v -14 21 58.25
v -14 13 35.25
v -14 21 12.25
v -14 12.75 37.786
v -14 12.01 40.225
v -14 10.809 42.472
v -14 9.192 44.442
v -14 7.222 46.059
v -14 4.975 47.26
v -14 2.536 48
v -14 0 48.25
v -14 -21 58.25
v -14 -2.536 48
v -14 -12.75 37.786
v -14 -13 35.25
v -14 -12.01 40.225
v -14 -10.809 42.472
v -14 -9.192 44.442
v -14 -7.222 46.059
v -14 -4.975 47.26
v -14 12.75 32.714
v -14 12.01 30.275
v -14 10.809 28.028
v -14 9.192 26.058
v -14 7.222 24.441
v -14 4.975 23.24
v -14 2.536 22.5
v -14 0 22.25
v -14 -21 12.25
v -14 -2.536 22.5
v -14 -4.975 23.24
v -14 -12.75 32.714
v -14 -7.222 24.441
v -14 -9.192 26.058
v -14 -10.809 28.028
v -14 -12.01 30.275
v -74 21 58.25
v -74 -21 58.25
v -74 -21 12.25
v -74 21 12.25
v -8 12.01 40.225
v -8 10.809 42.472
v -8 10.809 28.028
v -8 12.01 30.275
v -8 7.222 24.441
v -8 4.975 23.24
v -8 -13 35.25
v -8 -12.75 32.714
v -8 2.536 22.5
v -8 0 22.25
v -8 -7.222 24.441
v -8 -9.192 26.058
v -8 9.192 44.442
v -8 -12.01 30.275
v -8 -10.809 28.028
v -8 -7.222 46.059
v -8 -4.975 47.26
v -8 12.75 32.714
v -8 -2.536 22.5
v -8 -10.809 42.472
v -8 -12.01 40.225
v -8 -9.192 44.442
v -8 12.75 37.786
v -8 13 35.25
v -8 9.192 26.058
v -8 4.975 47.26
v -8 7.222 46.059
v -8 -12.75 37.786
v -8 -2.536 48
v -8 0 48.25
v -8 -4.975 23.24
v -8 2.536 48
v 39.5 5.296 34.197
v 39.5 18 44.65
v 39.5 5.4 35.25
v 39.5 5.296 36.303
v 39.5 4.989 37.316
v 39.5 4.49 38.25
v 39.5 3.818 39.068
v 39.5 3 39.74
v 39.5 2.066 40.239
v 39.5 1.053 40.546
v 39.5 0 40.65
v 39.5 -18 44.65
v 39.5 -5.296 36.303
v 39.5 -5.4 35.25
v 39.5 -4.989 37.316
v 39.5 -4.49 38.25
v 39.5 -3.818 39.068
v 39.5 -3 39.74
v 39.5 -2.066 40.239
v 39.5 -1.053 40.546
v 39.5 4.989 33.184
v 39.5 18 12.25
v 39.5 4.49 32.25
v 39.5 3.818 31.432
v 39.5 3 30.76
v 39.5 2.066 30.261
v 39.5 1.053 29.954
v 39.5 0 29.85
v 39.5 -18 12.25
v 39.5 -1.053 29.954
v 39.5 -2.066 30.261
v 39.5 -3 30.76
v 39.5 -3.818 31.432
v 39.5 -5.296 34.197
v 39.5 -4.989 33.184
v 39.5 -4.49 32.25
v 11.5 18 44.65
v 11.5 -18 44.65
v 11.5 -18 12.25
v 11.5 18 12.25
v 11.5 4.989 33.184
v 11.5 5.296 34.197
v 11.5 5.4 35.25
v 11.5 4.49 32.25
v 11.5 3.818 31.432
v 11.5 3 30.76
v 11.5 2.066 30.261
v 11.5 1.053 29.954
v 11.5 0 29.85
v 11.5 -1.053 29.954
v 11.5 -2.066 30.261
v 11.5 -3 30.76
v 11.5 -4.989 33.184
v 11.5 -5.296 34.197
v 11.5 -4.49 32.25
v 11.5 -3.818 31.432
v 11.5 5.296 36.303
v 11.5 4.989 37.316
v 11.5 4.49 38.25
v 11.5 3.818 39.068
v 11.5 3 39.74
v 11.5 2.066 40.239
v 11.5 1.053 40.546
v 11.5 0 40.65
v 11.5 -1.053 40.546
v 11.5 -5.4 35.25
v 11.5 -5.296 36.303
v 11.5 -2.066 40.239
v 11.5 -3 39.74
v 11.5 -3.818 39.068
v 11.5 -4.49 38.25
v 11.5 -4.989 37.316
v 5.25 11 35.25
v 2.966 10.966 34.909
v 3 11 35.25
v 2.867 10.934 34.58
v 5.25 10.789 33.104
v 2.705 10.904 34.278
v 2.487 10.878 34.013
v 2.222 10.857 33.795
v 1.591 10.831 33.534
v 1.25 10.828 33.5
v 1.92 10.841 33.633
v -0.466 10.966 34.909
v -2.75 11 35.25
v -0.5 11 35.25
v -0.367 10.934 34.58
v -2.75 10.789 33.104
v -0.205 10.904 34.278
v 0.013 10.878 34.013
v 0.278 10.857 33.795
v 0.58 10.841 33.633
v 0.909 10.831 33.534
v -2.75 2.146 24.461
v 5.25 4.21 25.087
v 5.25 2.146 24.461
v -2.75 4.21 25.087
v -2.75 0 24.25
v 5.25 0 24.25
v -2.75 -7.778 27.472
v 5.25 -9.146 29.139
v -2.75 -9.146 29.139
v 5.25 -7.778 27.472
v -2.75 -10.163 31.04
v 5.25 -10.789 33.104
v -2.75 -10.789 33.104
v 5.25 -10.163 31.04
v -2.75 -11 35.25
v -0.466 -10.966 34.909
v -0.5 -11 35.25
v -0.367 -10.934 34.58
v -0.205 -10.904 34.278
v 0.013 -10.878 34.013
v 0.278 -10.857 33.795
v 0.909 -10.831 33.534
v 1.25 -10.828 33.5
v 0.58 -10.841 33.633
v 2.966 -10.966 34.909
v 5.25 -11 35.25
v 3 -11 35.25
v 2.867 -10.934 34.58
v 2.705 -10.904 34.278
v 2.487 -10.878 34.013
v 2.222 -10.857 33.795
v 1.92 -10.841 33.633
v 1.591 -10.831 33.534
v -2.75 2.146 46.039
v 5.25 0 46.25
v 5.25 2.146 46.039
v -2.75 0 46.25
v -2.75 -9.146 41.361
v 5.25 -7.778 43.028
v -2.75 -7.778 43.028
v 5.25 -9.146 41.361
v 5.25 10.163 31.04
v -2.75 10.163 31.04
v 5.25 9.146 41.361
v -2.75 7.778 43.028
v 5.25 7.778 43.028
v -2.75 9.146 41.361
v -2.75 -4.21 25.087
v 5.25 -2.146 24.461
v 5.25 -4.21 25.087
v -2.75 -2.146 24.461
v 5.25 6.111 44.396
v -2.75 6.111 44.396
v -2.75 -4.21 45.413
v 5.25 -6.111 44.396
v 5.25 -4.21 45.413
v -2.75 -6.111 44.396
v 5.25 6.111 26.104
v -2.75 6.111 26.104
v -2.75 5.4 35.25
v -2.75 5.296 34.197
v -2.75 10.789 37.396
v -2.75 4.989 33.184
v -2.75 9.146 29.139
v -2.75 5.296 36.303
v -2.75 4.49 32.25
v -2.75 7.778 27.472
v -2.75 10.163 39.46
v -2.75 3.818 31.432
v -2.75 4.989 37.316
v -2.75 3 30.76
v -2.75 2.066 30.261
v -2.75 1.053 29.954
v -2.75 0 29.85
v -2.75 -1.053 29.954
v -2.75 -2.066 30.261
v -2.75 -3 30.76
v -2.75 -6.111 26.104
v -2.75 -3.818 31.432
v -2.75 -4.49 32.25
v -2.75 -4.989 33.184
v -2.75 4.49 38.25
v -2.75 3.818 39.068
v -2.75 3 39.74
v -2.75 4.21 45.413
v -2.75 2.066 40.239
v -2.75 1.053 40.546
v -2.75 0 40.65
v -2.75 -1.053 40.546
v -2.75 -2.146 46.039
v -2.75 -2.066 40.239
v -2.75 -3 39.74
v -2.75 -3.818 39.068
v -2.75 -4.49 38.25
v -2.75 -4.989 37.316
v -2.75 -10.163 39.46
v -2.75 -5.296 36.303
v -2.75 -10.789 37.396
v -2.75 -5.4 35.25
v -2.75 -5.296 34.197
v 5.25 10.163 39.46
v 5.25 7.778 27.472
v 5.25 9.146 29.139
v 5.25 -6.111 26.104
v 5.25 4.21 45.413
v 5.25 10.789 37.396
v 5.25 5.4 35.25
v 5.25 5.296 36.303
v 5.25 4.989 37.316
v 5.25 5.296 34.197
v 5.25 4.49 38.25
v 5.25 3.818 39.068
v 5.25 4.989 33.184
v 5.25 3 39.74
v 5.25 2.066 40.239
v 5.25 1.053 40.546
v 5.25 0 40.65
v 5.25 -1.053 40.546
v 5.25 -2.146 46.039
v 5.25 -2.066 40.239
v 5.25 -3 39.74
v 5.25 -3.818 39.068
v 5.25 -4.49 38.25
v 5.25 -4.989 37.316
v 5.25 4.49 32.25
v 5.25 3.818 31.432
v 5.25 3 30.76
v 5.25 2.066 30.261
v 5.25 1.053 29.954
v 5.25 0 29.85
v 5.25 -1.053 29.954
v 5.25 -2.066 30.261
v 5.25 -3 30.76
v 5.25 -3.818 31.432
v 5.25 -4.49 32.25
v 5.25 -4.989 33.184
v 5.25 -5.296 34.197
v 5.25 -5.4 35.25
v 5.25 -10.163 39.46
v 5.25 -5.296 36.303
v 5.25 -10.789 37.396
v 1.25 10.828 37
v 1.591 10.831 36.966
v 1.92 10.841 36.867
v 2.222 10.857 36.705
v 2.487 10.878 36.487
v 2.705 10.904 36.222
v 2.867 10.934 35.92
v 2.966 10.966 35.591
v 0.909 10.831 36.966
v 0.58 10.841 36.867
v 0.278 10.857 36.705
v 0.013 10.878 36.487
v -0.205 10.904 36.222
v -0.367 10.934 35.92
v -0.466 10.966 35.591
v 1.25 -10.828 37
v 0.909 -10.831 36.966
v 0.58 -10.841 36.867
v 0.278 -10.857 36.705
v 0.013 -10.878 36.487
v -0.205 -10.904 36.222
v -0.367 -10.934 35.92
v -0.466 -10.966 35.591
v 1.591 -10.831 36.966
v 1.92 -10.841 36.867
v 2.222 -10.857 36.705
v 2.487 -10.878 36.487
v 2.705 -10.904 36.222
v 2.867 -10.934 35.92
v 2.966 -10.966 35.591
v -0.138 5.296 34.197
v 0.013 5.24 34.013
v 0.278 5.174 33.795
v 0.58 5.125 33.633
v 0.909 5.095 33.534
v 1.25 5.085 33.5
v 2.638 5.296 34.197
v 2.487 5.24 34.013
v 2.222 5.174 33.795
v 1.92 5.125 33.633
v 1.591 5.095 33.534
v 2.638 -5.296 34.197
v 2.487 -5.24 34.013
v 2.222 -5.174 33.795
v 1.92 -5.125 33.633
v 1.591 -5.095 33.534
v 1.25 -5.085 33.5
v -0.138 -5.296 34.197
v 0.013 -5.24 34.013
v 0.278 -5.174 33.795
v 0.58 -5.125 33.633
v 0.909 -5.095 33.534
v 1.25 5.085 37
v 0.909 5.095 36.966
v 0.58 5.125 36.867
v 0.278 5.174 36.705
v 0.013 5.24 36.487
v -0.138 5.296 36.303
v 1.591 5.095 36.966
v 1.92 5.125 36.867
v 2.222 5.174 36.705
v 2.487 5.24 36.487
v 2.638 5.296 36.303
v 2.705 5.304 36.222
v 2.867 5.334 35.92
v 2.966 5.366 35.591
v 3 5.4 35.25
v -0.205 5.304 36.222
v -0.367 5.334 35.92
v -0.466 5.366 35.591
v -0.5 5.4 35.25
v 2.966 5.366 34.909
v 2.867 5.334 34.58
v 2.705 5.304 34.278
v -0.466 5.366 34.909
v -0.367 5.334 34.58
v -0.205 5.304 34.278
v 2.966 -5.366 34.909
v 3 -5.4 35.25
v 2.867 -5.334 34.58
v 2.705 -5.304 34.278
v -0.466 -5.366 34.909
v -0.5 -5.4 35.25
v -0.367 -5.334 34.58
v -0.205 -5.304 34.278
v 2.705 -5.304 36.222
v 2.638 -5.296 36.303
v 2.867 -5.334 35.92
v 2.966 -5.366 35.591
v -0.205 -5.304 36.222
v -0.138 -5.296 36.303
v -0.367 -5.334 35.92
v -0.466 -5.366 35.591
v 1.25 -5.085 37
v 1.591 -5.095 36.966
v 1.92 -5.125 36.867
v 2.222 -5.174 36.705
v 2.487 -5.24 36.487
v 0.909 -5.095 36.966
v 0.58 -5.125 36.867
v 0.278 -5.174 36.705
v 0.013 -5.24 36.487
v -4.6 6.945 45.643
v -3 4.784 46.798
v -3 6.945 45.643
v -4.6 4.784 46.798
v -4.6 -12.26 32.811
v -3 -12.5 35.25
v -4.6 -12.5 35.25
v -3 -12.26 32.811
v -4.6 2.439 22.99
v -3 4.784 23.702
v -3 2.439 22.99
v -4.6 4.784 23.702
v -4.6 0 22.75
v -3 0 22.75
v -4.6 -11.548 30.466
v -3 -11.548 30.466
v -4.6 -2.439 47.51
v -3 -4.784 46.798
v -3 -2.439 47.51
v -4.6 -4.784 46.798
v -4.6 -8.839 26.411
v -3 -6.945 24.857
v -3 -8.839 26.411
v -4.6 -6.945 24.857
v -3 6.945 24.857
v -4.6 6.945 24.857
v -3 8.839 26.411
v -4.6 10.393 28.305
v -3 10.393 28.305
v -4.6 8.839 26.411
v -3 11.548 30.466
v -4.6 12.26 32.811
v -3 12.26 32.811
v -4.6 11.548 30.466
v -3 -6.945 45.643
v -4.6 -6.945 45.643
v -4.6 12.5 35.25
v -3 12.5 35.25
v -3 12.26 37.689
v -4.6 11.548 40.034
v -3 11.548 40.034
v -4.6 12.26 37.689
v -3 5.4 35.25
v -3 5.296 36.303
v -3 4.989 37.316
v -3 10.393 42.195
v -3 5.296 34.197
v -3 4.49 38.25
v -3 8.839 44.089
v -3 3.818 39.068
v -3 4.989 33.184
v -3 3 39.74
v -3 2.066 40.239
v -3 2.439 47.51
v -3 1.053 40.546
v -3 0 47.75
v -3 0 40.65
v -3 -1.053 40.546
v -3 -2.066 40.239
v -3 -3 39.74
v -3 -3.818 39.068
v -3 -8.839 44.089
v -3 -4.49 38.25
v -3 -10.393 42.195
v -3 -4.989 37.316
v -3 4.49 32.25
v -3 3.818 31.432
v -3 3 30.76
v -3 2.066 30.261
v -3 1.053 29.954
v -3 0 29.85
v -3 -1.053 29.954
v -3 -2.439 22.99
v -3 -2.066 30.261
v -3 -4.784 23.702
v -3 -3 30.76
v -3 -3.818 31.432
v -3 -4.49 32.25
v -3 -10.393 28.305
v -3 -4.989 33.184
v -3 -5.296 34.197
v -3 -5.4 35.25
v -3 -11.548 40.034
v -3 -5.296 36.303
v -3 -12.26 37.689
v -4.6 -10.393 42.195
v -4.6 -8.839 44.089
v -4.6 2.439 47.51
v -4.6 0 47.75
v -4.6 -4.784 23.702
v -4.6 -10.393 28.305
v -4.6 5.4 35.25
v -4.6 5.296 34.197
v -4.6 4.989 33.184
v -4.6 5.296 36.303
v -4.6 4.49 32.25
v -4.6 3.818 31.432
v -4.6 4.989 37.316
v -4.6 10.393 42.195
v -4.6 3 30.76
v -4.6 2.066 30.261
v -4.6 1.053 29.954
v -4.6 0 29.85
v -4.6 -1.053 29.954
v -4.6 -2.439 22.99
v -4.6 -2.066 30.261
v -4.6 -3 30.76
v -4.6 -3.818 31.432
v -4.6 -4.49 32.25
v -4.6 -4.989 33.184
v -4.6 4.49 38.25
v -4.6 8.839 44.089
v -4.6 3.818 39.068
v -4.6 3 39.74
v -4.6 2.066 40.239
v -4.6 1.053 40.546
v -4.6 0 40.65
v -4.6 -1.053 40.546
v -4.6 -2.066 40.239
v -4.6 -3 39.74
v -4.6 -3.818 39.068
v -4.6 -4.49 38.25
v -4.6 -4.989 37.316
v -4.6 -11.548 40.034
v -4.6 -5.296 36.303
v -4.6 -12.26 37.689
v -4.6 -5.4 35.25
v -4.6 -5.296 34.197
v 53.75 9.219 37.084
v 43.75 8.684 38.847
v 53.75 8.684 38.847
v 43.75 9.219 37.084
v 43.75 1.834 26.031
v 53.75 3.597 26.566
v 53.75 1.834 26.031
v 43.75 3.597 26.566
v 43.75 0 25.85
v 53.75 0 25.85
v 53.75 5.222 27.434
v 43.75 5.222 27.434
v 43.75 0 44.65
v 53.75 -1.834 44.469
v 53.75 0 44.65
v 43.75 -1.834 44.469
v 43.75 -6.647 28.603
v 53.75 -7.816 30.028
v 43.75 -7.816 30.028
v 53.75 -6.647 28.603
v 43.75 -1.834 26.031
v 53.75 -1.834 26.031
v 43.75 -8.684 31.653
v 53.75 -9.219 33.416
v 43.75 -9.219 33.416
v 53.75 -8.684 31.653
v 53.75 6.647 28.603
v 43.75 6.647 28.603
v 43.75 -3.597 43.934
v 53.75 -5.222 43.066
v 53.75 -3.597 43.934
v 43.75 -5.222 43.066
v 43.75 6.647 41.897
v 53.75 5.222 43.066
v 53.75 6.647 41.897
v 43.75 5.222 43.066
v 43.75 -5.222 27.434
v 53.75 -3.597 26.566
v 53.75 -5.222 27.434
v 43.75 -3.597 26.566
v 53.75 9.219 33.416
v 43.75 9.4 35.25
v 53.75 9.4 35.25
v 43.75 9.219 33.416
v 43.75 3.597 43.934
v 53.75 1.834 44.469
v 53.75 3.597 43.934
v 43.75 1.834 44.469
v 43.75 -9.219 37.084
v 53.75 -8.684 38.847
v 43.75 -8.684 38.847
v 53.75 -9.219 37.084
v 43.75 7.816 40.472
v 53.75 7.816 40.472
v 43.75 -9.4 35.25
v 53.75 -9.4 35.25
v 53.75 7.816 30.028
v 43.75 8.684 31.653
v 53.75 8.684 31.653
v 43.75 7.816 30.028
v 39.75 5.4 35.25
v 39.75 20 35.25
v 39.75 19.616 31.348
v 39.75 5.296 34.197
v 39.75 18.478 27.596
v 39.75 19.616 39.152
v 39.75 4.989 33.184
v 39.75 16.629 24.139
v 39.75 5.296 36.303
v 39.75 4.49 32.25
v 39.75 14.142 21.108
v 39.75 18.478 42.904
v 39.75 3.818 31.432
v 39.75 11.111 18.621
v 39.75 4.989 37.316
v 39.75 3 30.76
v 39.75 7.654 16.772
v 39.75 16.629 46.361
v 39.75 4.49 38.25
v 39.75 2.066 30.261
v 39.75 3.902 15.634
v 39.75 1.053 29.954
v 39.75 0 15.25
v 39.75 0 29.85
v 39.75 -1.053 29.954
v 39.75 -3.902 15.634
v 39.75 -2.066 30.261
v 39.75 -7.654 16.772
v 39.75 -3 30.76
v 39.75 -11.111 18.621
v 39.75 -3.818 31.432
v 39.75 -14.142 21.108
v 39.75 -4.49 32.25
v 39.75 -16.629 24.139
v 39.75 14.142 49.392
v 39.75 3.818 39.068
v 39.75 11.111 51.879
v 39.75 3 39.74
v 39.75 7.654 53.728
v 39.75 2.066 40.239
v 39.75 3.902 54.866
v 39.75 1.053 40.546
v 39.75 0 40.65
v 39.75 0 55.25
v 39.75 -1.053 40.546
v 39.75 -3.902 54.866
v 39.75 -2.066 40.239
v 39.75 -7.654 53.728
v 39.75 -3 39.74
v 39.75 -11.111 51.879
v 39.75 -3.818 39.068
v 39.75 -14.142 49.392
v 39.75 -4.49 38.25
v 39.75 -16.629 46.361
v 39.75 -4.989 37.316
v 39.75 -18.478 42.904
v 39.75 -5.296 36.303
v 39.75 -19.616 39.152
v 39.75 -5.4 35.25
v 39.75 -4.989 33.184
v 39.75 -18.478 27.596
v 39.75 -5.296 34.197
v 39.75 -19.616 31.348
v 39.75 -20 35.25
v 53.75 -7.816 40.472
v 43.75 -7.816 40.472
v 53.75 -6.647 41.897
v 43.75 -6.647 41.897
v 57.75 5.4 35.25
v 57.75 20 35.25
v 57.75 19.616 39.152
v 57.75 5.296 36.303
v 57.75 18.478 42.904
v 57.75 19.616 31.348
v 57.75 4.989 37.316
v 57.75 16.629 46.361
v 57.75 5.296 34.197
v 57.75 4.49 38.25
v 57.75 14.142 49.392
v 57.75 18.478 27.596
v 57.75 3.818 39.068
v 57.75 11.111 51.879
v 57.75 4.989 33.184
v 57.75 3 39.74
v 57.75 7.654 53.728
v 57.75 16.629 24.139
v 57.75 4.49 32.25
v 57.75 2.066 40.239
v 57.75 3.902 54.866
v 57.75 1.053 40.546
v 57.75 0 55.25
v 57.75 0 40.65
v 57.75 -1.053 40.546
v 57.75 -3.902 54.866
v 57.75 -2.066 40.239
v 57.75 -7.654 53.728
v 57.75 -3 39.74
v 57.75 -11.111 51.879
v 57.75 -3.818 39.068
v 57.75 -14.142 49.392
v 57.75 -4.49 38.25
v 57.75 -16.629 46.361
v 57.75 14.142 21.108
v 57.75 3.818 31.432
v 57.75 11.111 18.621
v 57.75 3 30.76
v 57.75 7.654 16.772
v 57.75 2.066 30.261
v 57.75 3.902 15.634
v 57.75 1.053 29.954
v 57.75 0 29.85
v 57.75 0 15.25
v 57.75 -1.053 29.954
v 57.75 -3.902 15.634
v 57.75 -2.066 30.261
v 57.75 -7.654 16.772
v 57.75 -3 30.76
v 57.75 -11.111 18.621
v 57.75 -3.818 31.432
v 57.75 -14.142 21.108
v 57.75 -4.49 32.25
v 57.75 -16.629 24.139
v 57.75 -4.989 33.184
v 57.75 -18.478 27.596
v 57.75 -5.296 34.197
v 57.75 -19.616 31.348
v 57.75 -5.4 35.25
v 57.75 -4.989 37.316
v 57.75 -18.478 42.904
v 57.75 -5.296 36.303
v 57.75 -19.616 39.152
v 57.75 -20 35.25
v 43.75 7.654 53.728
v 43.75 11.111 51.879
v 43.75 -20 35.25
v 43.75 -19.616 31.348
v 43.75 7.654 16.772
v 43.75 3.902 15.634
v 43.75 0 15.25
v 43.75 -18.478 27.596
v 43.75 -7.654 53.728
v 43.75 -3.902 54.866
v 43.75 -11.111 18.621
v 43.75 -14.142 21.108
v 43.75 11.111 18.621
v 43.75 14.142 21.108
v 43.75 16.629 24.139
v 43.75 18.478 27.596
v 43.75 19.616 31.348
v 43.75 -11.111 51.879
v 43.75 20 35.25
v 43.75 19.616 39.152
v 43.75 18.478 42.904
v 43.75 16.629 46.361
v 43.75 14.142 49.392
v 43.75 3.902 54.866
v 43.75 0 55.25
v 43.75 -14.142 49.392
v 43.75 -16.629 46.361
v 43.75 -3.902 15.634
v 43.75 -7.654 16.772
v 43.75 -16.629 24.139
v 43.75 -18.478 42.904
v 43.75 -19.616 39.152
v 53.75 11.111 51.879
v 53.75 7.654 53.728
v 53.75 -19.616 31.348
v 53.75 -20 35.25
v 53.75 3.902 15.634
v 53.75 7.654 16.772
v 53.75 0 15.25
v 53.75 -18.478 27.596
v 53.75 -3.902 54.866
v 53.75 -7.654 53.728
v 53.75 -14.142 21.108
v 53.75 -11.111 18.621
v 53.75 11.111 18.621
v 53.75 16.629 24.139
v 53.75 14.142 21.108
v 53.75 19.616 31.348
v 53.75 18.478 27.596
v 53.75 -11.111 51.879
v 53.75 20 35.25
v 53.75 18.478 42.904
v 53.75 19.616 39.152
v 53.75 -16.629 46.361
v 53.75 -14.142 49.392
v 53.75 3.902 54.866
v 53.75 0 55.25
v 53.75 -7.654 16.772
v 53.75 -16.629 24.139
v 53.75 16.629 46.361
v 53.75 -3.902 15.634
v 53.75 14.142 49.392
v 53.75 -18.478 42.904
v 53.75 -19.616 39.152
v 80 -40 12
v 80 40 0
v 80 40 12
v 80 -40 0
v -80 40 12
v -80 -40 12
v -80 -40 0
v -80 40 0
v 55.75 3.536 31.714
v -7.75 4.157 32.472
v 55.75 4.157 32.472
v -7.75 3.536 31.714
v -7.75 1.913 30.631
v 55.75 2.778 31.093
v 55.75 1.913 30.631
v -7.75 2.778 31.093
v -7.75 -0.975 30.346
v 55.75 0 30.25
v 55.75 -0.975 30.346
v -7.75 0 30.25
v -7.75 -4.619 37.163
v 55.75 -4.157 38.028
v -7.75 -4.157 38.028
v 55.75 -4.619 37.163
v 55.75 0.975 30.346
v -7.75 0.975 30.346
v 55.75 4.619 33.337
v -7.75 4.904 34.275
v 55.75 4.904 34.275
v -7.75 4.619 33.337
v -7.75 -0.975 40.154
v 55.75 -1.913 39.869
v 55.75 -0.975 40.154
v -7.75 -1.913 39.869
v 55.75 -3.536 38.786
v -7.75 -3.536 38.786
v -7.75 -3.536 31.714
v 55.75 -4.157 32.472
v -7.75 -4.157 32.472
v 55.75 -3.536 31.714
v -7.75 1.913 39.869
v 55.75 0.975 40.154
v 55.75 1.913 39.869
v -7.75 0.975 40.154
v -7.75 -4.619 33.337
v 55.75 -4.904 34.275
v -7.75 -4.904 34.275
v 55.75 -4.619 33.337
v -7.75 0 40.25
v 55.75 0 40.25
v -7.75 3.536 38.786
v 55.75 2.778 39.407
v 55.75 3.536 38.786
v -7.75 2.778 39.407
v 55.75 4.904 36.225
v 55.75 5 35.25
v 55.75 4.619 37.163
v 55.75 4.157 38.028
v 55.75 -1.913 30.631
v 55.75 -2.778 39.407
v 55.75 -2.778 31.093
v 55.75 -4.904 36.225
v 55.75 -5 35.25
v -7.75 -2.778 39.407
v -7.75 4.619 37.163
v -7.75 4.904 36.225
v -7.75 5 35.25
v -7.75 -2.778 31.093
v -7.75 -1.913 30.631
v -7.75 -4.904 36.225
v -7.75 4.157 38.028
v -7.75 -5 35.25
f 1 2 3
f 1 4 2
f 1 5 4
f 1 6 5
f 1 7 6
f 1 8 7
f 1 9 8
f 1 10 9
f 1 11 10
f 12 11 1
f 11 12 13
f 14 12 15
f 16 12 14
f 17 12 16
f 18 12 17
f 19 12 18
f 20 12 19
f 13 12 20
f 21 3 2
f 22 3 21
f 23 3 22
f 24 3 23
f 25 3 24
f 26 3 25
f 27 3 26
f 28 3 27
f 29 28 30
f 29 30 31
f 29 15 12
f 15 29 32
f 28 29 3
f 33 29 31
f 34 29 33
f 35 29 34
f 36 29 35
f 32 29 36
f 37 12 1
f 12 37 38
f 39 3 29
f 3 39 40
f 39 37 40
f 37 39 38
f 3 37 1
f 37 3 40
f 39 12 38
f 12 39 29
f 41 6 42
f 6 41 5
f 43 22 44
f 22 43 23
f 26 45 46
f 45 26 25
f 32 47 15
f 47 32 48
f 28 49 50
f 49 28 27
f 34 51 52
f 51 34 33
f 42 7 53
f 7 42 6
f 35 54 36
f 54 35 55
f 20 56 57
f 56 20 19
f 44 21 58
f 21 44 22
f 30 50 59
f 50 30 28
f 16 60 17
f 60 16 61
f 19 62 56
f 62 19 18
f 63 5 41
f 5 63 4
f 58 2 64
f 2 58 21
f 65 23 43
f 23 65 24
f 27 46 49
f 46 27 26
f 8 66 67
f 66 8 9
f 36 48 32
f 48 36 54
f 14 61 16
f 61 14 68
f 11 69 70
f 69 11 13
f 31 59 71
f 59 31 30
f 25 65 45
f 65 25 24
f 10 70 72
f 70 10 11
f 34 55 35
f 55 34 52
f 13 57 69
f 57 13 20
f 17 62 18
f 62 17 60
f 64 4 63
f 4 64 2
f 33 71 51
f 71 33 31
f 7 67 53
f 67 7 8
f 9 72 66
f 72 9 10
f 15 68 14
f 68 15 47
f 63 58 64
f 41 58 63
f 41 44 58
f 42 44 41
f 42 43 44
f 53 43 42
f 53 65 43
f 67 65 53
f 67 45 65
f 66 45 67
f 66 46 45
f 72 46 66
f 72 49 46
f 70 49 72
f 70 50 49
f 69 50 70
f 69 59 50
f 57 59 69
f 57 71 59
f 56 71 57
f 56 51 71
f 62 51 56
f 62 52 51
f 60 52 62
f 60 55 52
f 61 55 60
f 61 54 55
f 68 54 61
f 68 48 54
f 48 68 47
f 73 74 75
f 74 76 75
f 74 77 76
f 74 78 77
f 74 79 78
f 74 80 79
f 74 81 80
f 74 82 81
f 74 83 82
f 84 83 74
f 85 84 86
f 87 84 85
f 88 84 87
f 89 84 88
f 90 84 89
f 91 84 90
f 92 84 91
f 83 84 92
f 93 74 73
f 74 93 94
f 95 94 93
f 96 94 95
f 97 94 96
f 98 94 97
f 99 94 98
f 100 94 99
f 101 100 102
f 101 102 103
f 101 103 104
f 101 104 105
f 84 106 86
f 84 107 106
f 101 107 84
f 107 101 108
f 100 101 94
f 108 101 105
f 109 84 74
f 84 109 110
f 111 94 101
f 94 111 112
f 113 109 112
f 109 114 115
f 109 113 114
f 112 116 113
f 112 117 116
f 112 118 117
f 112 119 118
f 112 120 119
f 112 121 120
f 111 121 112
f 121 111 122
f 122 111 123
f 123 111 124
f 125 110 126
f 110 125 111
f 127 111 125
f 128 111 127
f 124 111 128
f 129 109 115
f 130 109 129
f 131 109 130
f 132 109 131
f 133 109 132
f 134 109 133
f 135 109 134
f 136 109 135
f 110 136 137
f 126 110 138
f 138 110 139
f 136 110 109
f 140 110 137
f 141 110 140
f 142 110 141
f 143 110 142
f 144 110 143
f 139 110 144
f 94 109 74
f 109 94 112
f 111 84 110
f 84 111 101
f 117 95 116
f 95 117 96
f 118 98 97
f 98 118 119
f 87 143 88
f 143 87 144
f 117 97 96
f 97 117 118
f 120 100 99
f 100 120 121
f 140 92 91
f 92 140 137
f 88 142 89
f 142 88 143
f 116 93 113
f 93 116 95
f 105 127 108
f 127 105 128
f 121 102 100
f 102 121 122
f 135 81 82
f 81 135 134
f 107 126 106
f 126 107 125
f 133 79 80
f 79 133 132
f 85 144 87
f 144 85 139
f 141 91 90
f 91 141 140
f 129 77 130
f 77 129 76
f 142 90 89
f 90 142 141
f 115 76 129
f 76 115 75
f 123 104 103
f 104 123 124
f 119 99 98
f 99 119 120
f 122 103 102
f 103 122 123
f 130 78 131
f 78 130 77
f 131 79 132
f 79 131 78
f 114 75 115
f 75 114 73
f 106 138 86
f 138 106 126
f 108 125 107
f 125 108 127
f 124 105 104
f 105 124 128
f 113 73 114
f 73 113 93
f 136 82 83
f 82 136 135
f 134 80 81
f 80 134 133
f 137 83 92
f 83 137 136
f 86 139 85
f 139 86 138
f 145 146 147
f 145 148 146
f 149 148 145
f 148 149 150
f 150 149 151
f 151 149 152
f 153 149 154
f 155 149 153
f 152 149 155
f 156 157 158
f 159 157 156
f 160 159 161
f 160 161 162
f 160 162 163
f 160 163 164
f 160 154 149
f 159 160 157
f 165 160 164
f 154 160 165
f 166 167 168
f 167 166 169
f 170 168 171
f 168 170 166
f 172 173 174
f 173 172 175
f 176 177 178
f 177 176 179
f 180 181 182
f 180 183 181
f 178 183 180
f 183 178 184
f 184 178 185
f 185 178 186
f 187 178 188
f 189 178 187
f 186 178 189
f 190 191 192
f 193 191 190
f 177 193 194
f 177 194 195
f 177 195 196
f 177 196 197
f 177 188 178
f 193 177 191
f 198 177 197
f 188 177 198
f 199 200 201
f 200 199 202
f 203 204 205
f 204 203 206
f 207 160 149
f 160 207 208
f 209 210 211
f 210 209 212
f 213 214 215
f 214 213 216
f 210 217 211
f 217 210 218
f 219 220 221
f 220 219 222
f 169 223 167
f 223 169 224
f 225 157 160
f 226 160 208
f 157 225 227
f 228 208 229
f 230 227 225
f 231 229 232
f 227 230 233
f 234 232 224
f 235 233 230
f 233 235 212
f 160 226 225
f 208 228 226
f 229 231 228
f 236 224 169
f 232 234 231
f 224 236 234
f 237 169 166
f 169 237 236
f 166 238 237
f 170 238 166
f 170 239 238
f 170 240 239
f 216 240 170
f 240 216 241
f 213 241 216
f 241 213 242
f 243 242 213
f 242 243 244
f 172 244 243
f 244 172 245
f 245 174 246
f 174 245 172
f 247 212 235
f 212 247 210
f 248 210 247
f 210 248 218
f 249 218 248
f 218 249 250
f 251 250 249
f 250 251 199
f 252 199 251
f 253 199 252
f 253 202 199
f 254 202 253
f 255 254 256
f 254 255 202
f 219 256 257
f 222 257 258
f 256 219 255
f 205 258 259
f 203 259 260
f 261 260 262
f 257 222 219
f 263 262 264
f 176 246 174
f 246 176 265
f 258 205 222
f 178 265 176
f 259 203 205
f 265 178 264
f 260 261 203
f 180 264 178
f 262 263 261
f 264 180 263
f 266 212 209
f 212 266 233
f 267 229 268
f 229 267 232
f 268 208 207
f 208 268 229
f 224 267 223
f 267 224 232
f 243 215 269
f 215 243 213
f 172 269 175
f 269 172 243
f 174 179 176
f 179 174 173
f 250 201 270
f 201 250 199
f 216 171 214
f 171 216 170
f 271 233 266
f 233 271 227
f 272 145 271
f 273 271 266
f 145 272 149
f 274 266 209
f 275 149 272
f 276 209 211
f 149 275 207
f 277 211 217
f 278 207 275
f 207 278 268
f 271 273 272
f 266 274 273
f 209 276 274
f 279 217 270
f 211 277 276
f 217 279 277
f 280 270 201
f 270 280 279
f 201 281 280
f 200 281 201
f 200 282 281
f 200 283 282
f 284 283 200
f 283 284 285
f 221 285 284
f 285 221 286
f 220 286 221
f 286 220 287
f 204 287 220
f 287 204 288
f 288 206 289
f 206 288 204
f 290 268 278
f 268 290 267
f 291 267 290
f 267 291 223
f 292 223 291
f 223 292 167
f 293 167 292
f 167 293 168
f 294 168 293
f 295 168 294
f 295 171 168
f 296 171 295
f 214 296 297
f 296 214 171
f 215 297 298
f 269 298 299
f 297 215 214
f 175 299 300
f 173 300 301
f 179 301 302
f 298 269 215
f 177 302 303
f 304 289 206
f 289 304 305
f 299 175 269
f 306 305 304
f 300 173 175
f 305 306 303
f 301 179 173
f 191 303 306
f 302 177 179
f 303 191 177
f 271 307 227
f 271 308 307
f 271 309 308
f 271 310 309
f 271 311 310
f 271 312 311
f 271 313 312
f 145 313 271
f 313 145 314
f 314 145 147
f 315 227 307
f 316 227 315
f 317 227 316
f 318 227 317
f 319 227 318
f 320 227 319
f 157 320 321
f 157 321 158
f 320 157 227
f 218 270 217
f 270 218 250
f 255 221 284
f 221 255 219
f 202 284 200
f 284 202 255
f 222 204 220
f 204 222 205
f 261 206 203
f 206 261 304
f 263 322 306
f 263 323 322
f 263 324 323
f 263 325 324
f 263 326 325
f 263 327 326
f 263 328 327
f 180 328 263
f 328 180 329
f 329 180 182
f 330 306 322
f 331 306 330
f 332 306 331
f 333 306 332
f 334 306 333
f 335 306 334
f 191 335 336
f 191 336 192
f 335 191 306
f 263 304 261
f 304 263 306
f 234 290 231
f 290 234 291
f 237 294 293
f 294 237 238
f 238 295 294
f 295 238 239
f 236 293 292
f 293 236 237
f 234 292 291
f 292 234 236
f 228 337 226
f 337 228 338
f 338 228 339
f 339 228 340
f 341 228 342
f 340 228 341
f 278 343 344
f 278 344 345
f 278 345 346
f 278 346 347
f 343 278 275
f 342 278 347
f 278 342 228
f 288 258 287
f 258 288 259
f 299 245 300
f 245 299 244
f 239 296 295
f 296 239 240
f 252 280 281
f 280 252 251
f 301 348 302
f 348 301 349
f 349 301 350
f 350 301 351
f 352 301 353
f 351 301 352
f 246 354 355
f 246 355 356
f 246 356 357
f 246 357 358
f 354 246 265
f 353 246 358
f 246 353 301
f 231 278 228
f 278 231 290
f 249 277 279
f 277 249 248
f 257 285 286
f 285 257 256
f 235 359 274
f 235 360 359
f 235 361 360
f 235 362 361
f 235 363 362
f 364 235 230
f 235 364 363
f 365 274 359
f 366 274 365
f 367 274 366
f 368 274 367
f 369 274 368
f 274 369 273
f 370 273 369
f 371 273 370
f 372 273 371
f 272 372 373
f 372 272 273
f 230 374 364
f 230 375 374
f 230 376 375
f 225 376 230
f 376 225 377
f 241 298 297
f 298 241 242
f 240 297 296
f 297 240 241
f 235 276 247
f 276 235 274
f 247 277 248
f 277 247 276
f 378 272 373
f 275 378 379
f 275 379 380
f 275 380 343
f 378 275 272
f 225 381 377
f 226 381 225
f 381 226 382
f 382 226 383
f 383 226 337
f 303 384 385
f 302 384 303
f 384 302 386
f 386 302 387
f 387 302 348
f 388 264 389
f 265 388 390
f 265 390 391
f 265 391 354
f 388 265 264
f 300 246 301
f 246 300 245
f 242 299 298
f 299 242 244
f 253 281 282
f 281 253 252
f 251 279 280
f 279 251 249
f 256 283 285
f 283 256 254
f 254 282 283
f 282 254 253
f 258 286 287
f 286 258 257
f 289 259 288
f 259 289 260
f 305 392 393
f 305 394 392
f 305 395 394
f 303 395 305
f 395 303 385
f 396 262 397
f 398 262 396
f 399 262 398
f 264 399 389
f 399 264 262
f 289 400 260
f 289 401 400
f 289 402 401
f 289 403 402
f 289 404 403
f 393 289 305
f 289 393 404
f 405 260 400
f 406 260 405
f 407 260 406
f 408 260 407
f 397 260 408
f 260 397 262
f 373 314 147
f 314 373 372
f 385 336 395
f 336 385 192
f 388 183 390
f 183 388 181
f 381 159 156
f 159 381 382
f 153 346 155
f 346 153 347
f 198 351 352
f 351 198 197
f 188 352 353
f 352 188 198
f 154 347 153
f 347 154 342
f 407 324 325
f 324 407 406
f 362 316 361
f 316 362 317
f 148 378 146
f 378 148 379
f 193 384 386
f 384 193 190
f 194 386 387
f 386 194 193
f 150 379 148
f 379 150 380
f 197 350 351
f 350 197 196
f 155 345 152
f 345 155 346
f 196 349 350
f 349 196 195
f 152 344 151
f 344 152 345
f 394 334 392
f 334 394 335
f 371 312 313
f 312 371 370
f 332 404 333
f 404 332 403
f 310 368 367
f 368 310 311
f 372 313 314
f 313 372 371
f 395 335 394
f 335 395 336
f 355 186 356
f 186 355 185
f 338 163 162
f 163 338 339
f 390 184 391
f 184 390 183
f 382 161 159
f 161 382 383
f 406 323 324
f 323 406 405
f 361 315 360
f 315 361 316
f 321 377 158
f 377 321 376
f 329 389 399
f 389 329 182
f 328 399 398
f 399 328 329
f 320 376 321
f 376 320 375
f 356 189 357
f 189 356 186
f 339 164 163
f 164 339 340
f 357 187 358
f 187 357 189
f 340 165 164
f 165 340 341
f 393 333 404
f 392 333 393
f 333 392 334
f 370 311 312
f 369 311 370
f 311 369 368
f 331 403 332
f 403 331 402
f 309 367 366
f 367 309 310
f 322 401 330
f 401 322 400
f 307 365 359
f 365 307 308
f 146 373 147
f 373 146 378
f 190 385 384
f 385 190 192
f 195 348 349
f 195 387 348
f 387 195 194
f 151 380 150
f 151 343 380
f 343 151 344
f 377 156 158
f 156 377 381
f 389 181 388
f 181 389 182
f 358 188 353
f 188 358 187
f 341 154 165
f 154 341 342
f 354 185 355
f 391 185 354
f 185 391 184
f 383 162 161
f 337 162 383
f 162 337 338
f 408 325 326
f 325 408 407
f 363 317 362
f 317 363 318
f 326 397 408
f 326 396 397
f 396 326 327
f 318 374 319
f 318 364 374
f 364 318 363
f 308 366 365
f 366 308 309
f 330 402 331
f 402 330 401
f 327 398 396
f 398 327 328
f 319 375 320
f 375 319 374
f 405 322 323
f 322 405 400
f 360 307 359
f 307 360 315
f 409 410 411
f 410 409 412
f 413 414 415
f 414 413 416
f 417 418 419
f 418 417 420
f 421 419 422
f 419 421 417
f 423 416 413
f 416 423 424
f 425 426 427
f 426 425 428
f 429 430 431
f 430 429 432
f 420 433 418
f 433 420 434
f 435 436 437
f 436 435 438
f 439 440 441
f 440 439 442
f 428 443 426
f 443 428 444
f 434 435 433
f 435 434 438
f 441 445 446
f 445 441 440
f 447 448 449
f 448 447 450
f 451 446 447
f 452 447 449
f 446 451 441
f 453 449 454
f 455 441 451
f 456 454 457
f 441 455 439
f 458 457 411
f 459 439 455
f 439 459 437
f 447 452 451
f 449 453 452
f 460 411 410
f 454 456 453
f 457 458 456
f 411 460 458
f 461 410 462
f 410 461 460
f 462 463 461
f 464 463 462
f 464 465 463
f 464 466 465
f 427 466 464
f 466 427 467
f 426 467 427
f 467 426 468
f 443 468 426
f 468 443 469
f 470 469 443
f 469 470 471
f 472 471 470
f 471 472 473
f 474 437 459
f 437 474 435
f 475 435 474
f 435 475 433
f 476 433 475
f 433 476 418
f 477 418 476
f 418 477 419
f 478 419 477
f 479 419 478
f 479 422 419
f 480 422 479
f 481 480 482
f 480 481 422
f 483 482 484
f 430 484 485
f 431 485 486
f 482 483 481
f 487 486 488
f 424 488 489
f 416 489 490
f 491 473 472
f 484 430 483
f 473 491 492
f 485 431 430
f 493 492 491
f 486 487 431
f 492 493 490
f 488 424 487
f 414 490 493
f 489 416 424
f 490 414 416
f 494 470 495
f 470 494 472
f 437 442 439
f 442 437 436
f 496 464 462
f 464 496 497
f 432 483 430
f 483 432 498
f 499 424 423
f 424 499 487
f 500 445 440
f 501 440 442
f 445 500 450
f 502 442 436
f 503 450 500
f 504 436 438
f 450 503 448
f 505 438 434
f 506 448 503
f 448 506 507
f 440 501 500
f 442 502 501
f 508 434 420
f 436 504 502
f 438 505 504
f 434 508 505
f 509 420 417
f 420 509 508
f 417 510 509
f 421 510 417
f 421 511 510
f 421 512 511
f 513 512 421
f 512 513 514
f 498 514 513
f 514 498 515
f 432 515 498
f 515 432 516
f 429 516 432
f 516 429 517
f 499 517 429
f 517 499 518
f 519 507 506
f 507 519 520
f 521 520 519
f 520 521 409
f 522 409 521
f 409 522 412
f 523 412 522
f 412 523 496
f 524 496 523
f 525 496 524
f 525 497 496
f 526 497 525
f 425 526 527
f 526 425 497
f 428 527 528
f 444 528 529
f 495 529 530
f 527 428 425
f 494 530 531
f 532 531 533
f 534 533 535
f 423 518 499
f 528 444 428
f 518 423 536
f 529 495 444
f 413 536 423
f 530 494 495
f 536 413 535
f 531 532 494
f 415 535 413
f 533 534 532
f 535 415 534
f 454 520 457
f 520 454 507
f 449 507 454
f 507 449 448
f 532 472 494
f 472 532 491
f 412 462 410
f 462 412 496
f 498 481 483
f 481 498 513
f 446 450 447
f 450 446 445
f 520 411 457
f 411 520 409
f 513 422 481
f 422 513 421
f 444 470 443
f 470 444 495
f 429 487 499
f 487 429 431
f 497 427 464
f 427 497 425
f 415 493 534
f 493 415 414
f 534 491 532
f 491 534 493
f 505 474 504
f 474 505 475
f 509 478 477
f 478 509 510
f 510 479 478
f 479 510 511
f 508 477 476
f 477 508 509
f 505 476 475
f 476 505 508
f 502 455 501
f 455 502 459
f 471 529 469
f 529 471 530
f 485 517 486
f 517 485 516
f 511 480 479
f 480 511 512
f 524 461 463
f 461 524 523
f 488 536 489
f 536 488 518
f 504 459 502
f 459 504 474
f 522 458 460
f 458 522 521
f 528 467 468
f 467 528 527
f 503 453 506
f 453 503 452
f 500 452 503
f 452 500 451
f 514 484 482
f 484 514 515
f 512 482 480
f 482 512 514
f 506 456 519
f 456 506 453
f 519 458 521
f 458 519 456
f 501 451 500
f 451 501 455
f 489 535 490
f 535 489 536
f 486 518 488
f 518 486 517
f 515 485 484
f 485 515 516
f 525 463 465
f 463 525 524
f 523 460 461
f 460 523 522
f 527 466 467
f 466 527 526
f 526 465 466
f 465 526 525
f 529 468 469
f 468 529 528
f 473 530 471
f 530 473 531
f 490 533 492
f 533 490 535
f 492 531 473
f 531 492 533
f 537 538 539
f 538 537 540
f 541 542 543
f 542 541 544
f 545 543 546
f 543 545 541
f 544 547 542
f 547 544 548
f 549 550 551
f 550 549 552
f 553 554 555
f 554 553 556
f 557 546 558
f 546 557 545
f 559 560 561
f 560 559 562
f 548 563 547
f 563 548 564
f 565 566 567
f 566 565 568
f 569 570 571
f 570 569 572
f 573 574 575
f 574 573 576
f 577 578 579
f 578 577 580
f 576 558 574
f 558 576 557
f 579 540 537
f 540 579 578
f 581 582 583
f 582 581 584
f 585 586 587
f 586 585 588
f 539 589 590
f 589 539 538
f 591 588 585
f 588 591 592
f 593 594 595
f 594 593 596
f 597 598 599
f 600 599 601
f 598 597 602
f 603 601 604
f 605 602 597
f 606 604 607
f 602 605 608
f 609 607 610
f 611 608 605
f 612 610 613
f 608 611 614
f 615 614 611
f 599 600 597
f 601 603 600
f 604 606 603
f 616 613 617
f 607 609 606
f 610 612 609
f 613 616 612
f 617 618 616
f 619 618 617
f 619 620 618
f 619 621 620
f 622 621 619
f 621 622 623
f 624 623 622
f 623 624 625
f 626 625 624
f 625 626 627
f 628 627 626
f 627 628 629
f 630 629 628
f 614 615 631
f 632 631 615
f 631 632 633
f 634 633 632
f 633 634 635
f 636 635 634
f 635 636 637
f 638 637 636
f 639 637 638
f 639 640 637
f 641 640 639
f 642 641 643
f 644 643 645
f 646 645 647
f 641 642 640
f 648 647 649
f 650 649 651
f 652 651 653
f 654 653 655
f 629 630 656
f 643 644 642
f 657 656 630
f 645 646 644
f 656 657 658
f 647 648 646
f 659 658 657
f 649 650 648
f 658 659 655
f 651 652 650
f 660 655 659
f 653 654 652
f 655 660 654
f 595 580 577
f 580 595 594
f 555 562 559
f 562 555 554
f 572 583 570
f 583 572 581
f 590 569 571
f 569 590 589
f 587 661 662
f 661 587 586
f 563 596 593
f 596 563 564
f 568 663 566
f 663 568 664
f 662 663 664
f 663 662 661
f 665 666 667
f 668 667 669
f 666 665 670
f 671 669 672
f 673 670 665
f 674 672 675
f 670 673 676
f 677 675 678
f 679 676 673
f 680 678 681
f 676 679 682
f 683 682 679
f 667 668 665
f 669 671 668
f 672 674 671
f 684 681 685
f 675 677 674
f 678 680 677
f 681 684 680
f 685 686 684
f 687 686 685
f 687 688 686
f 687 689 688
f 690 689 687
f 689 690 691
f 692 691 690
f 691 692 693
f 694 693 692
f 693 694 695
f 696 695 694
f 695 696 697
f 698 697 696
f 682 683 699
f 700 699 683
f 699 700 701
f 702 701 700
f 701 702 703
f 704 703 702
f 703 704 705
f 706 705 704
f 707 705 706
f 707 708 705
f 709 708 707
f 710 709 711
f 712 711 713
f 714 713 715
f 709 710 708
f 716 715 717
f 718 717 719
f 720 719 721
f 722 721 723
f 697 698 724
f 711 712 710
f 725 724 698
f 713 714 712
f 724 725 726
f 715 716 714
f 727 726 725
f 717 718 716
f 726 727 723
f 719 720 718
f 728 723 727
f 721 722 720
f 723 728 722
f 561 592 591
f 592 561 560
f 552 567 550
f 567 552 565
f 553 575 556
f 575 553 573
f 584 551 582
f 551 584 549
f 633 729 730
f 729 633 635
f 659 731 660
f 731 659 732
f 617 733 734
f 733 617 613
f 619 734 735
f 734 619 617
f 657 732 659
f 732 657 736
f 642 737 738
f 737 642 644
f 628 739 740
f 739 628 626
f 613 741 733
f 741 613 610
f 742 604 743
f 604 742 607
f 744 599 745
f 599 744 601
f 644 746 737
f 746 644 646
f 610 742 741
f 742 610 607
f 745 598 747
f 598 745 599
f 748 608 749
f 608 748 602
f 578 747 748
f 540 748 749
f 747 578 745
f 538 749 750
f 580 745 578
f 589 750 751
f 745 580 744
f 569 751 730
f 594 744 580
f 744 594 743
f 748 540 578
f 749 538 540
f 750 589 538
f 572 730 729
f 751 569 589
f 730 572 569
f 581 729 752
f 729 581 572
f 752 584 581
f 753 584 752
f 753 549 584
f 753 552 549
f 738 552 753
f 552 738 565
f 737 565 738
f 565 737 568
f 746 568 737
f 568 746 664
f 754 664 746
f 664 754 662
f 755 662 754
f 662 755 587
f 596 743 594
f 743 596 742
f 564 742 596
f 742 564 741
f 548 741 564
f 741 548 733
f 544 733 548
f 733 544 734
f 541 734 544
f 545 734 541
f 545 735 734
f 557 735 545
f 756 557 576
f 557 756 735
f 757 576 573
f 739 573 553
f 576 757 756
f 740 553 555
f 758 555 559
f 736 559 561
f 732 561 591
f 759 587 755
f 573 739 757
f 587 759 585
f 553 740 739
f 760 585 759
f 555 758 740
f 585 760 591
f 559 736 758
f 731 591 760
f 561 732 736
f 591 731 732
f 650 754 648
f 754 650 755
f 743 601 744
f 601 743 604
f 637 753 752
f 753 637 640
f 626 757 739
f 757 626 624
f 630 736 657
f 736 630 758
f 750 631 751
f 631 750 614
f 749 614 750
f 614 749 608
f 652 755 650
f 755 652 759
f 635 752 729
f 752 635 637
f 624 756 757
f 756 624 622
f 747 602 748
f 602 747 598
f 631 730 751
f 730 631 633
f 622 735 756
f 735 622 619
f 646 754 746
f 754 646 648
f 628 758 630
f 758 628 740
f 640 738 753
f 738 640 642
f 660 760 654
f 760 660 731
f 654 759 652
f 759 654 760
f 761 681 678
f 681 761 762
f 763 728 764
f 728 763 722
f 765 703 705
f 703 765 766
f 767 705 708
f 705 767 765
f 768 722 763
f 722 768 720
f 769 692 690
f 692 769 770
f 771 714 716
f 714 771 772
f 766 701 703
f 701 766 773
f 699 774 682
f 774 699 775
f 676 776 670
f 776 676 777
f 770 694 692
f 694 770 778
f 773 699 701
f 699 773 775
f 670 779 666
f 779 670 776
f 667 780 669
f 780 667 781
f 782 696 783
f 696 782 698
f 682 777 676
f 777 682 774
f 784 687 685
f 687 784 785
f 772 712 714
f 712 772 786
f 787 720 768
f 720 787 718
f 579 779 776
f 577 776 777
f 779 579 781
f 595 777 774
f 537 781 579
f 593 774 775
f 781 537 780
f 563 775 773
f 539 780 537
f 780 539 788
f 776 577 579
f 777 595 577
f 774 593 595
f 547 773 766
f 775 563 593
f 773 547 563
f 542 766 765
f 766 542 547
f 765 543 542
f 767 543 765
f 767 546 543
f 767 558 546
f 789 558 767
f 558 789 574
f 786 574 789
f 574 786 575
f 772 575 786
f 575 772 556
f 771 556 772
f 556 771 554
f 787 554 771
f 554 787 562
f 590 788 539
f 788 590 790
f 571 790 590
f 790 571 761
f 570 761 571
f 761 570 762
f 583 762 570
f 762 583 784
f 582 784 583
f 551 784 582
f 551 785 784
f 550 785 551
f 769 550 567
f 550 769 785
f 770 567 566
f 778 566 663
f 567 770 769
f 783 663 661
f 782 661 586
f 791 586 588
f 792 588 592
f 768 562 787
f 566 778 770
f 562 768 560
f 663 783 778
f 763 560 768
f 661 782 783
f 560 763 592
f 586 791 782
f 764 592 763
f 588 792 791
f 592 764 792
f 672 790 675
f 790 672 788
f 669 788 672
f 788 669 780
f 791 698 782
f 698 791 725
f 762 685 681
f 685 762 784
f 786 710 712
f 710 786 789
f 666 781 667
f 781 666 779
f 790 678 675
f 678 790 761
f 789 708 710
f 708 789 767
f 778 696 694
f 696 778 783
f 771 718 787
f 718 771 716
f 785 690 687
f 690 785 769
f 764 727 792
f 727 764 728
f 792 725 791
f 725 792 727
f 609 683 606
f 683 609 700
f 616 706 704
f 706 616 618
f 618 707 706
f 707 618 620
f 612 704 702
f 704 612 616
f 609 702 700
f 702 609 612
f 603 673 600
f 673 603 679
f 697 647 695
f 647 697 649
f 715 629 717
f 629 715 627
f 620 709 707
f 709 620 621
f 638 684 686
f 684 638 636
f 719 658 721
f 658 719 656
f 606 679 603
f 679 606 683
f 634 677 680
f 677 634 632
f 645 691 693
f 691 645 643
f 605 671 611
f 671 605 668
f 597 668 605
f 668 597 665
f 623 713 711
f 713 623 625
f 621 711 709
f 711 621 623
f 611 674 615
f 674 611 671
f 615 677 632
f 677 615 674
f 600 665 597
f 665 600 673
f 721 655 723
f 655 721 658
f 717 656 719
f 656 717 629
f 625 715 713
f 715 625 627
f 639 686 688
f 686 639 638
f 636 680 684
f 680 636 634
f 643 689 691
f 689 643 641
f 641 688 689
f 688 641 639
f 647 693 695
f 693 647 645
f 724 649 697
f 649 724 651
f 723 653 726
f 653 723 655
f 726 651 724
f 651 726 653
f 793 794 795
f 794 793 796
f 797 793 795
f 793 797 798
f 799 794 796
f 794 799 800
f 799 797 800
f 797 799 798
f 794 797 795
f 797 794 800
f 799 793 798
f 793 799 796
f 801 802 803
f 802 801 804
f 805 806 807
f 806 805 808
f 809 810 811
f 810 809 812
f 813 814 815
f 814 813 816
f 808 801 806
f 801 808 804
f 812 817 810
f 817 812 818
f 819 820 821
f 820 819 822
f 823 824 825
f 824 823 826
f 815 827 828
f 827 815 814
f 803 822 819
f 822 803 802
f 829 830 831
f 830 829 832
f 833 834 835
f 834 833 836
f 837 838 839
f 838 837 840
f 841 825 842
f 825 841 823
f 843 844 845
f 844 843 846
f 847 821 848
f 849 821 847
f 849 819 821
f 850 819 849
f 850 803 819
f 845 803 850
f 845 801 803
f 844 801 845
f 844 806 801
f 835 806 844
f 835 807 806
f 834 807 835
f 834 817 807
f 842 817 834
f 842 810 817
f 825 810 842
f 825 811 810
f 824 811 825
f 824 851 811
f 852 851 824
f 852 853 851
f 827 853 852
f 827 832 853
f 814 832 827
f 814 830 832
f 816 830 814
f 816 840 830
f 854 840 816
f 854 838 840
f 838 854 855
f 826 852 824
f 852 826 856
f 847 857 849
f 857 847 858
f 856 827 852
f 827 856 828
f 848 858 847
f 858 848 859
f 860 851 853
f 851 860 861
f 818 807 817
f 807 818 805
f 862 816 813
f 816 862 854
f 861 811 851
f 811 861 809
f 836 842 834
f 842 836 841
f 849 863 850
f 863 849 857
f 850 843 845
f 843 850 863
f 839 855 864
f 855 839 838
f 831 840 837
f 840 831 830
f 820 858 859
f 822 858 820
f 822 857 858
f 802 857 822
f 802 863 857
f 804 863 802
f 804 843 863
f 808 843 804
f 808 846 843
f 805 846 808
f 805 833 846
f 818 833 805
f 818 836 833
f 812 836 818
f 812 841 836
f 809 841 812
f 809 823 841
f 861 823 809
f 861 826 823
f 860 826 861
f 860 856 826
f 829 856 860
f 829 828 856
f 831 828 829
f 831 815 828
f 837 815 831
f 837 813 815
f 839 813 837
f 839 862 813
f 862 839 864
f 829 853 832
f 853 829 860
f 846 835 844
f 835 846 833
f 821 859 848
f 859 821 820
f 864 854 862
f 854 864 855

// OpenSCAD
$fn = 32;

// ------------------------------------------------------------------------
// Motor drive station: motor 60 x 46 mm, shaft d10, pulley d40
// Every part is its own module, assembly() places every instance.
// ------------------------------------------------------------------------

// --- part 1 ---
module station_bed() {
  difference() {
    translate([-80, -40, 0]) cube([160, 80, 12]);
  }
}

// --- part 2 ---
module drive_motor() {
  union() {
    translate([-30, -21, 0]) cube([60, 42, 46]);
    translate([33, 0, 23]) rotate([0, 90, 0]) cylinder(h = 6, d = 26, center = true);
  }
}

// --- part 3 ---
module pillow_block() {
  difference() {
    translate([-14, -18, 0]) cube([28, 36, 32.4]);
    translate([0, 0, 23]) rotate([0, 90, 0]) cylinder(h = 30, d = 10.8, center = true);
  }
}

// --- part 4 ---
module drive_shaft() {
  translate([0, 0, -31.75]) cylinder(h = 63.5, d = 10);
}

// --- part 5 ---
module shaft_collar() {
  difference() {
    cylinder(h = 8, d = 22);
    translate([0, 0, -1]) cylinder(h = 10, d = 10.8);
    translate([0, 0, 4]) rotate([90, 0, 0]) cylinder(h = 24, d = 3.5, center = true);
  }
}

// --- part 6 ---
module collar_washer() {
  difference() {
      translate([0, 0, 0]) cylinder(h = 1.6, d = 25);
      translate([0, 0, -1]) cylinder(h = 3.6, d = 10.8);
    }
}

// --- part 7 ---
module drive_pulley() {
  difference() {
    union() {
      cylinder(h = 18, d = 18.8);
      cylinder(h = 4, d = 40);
      translate([0, 0, 14]) cylinder(h = 4, d = 40);
    }
    translate([0, 0, -1]) cylinder(h = 20, d = 10.8);
  }
}

// --- assembly ---
module assembly() {
  color([0.80, 0.24, 0.20]) translate([0, 0, 0]) rotate([0, 0, 0]) station_bed();
  color([0.20, 0.45, 0.75]) translate([-44, 0, 12.25]) rotate([0, 0, 0]) drive_motor();
  color([0.25, 0.62, 0.32]) translate([25.5, 0, 12.25]) rotate([0, 0, 0]) pillow_block();
  color([0.92, 0.70, 0.18]) translate([24, 0, 35.25]) rotate([0, 90, 0]) drive_shaft();
  color([0.58, 0.35, 0.70]) translate([-2.75, 0, 35.25]) rotate([0, 90, 0]) shaft_collar();
  color([0.16, 0.66, 0.66]) translate([-4.6, 0, 35.25]) rotate([0, 90, 0]) collar_washer();
  color([0.85, 0.48, 0.18]) translate([39.75, 0, 35.25]) rotate([0, 90, 0]) drive_pulley();
}

assembly();
